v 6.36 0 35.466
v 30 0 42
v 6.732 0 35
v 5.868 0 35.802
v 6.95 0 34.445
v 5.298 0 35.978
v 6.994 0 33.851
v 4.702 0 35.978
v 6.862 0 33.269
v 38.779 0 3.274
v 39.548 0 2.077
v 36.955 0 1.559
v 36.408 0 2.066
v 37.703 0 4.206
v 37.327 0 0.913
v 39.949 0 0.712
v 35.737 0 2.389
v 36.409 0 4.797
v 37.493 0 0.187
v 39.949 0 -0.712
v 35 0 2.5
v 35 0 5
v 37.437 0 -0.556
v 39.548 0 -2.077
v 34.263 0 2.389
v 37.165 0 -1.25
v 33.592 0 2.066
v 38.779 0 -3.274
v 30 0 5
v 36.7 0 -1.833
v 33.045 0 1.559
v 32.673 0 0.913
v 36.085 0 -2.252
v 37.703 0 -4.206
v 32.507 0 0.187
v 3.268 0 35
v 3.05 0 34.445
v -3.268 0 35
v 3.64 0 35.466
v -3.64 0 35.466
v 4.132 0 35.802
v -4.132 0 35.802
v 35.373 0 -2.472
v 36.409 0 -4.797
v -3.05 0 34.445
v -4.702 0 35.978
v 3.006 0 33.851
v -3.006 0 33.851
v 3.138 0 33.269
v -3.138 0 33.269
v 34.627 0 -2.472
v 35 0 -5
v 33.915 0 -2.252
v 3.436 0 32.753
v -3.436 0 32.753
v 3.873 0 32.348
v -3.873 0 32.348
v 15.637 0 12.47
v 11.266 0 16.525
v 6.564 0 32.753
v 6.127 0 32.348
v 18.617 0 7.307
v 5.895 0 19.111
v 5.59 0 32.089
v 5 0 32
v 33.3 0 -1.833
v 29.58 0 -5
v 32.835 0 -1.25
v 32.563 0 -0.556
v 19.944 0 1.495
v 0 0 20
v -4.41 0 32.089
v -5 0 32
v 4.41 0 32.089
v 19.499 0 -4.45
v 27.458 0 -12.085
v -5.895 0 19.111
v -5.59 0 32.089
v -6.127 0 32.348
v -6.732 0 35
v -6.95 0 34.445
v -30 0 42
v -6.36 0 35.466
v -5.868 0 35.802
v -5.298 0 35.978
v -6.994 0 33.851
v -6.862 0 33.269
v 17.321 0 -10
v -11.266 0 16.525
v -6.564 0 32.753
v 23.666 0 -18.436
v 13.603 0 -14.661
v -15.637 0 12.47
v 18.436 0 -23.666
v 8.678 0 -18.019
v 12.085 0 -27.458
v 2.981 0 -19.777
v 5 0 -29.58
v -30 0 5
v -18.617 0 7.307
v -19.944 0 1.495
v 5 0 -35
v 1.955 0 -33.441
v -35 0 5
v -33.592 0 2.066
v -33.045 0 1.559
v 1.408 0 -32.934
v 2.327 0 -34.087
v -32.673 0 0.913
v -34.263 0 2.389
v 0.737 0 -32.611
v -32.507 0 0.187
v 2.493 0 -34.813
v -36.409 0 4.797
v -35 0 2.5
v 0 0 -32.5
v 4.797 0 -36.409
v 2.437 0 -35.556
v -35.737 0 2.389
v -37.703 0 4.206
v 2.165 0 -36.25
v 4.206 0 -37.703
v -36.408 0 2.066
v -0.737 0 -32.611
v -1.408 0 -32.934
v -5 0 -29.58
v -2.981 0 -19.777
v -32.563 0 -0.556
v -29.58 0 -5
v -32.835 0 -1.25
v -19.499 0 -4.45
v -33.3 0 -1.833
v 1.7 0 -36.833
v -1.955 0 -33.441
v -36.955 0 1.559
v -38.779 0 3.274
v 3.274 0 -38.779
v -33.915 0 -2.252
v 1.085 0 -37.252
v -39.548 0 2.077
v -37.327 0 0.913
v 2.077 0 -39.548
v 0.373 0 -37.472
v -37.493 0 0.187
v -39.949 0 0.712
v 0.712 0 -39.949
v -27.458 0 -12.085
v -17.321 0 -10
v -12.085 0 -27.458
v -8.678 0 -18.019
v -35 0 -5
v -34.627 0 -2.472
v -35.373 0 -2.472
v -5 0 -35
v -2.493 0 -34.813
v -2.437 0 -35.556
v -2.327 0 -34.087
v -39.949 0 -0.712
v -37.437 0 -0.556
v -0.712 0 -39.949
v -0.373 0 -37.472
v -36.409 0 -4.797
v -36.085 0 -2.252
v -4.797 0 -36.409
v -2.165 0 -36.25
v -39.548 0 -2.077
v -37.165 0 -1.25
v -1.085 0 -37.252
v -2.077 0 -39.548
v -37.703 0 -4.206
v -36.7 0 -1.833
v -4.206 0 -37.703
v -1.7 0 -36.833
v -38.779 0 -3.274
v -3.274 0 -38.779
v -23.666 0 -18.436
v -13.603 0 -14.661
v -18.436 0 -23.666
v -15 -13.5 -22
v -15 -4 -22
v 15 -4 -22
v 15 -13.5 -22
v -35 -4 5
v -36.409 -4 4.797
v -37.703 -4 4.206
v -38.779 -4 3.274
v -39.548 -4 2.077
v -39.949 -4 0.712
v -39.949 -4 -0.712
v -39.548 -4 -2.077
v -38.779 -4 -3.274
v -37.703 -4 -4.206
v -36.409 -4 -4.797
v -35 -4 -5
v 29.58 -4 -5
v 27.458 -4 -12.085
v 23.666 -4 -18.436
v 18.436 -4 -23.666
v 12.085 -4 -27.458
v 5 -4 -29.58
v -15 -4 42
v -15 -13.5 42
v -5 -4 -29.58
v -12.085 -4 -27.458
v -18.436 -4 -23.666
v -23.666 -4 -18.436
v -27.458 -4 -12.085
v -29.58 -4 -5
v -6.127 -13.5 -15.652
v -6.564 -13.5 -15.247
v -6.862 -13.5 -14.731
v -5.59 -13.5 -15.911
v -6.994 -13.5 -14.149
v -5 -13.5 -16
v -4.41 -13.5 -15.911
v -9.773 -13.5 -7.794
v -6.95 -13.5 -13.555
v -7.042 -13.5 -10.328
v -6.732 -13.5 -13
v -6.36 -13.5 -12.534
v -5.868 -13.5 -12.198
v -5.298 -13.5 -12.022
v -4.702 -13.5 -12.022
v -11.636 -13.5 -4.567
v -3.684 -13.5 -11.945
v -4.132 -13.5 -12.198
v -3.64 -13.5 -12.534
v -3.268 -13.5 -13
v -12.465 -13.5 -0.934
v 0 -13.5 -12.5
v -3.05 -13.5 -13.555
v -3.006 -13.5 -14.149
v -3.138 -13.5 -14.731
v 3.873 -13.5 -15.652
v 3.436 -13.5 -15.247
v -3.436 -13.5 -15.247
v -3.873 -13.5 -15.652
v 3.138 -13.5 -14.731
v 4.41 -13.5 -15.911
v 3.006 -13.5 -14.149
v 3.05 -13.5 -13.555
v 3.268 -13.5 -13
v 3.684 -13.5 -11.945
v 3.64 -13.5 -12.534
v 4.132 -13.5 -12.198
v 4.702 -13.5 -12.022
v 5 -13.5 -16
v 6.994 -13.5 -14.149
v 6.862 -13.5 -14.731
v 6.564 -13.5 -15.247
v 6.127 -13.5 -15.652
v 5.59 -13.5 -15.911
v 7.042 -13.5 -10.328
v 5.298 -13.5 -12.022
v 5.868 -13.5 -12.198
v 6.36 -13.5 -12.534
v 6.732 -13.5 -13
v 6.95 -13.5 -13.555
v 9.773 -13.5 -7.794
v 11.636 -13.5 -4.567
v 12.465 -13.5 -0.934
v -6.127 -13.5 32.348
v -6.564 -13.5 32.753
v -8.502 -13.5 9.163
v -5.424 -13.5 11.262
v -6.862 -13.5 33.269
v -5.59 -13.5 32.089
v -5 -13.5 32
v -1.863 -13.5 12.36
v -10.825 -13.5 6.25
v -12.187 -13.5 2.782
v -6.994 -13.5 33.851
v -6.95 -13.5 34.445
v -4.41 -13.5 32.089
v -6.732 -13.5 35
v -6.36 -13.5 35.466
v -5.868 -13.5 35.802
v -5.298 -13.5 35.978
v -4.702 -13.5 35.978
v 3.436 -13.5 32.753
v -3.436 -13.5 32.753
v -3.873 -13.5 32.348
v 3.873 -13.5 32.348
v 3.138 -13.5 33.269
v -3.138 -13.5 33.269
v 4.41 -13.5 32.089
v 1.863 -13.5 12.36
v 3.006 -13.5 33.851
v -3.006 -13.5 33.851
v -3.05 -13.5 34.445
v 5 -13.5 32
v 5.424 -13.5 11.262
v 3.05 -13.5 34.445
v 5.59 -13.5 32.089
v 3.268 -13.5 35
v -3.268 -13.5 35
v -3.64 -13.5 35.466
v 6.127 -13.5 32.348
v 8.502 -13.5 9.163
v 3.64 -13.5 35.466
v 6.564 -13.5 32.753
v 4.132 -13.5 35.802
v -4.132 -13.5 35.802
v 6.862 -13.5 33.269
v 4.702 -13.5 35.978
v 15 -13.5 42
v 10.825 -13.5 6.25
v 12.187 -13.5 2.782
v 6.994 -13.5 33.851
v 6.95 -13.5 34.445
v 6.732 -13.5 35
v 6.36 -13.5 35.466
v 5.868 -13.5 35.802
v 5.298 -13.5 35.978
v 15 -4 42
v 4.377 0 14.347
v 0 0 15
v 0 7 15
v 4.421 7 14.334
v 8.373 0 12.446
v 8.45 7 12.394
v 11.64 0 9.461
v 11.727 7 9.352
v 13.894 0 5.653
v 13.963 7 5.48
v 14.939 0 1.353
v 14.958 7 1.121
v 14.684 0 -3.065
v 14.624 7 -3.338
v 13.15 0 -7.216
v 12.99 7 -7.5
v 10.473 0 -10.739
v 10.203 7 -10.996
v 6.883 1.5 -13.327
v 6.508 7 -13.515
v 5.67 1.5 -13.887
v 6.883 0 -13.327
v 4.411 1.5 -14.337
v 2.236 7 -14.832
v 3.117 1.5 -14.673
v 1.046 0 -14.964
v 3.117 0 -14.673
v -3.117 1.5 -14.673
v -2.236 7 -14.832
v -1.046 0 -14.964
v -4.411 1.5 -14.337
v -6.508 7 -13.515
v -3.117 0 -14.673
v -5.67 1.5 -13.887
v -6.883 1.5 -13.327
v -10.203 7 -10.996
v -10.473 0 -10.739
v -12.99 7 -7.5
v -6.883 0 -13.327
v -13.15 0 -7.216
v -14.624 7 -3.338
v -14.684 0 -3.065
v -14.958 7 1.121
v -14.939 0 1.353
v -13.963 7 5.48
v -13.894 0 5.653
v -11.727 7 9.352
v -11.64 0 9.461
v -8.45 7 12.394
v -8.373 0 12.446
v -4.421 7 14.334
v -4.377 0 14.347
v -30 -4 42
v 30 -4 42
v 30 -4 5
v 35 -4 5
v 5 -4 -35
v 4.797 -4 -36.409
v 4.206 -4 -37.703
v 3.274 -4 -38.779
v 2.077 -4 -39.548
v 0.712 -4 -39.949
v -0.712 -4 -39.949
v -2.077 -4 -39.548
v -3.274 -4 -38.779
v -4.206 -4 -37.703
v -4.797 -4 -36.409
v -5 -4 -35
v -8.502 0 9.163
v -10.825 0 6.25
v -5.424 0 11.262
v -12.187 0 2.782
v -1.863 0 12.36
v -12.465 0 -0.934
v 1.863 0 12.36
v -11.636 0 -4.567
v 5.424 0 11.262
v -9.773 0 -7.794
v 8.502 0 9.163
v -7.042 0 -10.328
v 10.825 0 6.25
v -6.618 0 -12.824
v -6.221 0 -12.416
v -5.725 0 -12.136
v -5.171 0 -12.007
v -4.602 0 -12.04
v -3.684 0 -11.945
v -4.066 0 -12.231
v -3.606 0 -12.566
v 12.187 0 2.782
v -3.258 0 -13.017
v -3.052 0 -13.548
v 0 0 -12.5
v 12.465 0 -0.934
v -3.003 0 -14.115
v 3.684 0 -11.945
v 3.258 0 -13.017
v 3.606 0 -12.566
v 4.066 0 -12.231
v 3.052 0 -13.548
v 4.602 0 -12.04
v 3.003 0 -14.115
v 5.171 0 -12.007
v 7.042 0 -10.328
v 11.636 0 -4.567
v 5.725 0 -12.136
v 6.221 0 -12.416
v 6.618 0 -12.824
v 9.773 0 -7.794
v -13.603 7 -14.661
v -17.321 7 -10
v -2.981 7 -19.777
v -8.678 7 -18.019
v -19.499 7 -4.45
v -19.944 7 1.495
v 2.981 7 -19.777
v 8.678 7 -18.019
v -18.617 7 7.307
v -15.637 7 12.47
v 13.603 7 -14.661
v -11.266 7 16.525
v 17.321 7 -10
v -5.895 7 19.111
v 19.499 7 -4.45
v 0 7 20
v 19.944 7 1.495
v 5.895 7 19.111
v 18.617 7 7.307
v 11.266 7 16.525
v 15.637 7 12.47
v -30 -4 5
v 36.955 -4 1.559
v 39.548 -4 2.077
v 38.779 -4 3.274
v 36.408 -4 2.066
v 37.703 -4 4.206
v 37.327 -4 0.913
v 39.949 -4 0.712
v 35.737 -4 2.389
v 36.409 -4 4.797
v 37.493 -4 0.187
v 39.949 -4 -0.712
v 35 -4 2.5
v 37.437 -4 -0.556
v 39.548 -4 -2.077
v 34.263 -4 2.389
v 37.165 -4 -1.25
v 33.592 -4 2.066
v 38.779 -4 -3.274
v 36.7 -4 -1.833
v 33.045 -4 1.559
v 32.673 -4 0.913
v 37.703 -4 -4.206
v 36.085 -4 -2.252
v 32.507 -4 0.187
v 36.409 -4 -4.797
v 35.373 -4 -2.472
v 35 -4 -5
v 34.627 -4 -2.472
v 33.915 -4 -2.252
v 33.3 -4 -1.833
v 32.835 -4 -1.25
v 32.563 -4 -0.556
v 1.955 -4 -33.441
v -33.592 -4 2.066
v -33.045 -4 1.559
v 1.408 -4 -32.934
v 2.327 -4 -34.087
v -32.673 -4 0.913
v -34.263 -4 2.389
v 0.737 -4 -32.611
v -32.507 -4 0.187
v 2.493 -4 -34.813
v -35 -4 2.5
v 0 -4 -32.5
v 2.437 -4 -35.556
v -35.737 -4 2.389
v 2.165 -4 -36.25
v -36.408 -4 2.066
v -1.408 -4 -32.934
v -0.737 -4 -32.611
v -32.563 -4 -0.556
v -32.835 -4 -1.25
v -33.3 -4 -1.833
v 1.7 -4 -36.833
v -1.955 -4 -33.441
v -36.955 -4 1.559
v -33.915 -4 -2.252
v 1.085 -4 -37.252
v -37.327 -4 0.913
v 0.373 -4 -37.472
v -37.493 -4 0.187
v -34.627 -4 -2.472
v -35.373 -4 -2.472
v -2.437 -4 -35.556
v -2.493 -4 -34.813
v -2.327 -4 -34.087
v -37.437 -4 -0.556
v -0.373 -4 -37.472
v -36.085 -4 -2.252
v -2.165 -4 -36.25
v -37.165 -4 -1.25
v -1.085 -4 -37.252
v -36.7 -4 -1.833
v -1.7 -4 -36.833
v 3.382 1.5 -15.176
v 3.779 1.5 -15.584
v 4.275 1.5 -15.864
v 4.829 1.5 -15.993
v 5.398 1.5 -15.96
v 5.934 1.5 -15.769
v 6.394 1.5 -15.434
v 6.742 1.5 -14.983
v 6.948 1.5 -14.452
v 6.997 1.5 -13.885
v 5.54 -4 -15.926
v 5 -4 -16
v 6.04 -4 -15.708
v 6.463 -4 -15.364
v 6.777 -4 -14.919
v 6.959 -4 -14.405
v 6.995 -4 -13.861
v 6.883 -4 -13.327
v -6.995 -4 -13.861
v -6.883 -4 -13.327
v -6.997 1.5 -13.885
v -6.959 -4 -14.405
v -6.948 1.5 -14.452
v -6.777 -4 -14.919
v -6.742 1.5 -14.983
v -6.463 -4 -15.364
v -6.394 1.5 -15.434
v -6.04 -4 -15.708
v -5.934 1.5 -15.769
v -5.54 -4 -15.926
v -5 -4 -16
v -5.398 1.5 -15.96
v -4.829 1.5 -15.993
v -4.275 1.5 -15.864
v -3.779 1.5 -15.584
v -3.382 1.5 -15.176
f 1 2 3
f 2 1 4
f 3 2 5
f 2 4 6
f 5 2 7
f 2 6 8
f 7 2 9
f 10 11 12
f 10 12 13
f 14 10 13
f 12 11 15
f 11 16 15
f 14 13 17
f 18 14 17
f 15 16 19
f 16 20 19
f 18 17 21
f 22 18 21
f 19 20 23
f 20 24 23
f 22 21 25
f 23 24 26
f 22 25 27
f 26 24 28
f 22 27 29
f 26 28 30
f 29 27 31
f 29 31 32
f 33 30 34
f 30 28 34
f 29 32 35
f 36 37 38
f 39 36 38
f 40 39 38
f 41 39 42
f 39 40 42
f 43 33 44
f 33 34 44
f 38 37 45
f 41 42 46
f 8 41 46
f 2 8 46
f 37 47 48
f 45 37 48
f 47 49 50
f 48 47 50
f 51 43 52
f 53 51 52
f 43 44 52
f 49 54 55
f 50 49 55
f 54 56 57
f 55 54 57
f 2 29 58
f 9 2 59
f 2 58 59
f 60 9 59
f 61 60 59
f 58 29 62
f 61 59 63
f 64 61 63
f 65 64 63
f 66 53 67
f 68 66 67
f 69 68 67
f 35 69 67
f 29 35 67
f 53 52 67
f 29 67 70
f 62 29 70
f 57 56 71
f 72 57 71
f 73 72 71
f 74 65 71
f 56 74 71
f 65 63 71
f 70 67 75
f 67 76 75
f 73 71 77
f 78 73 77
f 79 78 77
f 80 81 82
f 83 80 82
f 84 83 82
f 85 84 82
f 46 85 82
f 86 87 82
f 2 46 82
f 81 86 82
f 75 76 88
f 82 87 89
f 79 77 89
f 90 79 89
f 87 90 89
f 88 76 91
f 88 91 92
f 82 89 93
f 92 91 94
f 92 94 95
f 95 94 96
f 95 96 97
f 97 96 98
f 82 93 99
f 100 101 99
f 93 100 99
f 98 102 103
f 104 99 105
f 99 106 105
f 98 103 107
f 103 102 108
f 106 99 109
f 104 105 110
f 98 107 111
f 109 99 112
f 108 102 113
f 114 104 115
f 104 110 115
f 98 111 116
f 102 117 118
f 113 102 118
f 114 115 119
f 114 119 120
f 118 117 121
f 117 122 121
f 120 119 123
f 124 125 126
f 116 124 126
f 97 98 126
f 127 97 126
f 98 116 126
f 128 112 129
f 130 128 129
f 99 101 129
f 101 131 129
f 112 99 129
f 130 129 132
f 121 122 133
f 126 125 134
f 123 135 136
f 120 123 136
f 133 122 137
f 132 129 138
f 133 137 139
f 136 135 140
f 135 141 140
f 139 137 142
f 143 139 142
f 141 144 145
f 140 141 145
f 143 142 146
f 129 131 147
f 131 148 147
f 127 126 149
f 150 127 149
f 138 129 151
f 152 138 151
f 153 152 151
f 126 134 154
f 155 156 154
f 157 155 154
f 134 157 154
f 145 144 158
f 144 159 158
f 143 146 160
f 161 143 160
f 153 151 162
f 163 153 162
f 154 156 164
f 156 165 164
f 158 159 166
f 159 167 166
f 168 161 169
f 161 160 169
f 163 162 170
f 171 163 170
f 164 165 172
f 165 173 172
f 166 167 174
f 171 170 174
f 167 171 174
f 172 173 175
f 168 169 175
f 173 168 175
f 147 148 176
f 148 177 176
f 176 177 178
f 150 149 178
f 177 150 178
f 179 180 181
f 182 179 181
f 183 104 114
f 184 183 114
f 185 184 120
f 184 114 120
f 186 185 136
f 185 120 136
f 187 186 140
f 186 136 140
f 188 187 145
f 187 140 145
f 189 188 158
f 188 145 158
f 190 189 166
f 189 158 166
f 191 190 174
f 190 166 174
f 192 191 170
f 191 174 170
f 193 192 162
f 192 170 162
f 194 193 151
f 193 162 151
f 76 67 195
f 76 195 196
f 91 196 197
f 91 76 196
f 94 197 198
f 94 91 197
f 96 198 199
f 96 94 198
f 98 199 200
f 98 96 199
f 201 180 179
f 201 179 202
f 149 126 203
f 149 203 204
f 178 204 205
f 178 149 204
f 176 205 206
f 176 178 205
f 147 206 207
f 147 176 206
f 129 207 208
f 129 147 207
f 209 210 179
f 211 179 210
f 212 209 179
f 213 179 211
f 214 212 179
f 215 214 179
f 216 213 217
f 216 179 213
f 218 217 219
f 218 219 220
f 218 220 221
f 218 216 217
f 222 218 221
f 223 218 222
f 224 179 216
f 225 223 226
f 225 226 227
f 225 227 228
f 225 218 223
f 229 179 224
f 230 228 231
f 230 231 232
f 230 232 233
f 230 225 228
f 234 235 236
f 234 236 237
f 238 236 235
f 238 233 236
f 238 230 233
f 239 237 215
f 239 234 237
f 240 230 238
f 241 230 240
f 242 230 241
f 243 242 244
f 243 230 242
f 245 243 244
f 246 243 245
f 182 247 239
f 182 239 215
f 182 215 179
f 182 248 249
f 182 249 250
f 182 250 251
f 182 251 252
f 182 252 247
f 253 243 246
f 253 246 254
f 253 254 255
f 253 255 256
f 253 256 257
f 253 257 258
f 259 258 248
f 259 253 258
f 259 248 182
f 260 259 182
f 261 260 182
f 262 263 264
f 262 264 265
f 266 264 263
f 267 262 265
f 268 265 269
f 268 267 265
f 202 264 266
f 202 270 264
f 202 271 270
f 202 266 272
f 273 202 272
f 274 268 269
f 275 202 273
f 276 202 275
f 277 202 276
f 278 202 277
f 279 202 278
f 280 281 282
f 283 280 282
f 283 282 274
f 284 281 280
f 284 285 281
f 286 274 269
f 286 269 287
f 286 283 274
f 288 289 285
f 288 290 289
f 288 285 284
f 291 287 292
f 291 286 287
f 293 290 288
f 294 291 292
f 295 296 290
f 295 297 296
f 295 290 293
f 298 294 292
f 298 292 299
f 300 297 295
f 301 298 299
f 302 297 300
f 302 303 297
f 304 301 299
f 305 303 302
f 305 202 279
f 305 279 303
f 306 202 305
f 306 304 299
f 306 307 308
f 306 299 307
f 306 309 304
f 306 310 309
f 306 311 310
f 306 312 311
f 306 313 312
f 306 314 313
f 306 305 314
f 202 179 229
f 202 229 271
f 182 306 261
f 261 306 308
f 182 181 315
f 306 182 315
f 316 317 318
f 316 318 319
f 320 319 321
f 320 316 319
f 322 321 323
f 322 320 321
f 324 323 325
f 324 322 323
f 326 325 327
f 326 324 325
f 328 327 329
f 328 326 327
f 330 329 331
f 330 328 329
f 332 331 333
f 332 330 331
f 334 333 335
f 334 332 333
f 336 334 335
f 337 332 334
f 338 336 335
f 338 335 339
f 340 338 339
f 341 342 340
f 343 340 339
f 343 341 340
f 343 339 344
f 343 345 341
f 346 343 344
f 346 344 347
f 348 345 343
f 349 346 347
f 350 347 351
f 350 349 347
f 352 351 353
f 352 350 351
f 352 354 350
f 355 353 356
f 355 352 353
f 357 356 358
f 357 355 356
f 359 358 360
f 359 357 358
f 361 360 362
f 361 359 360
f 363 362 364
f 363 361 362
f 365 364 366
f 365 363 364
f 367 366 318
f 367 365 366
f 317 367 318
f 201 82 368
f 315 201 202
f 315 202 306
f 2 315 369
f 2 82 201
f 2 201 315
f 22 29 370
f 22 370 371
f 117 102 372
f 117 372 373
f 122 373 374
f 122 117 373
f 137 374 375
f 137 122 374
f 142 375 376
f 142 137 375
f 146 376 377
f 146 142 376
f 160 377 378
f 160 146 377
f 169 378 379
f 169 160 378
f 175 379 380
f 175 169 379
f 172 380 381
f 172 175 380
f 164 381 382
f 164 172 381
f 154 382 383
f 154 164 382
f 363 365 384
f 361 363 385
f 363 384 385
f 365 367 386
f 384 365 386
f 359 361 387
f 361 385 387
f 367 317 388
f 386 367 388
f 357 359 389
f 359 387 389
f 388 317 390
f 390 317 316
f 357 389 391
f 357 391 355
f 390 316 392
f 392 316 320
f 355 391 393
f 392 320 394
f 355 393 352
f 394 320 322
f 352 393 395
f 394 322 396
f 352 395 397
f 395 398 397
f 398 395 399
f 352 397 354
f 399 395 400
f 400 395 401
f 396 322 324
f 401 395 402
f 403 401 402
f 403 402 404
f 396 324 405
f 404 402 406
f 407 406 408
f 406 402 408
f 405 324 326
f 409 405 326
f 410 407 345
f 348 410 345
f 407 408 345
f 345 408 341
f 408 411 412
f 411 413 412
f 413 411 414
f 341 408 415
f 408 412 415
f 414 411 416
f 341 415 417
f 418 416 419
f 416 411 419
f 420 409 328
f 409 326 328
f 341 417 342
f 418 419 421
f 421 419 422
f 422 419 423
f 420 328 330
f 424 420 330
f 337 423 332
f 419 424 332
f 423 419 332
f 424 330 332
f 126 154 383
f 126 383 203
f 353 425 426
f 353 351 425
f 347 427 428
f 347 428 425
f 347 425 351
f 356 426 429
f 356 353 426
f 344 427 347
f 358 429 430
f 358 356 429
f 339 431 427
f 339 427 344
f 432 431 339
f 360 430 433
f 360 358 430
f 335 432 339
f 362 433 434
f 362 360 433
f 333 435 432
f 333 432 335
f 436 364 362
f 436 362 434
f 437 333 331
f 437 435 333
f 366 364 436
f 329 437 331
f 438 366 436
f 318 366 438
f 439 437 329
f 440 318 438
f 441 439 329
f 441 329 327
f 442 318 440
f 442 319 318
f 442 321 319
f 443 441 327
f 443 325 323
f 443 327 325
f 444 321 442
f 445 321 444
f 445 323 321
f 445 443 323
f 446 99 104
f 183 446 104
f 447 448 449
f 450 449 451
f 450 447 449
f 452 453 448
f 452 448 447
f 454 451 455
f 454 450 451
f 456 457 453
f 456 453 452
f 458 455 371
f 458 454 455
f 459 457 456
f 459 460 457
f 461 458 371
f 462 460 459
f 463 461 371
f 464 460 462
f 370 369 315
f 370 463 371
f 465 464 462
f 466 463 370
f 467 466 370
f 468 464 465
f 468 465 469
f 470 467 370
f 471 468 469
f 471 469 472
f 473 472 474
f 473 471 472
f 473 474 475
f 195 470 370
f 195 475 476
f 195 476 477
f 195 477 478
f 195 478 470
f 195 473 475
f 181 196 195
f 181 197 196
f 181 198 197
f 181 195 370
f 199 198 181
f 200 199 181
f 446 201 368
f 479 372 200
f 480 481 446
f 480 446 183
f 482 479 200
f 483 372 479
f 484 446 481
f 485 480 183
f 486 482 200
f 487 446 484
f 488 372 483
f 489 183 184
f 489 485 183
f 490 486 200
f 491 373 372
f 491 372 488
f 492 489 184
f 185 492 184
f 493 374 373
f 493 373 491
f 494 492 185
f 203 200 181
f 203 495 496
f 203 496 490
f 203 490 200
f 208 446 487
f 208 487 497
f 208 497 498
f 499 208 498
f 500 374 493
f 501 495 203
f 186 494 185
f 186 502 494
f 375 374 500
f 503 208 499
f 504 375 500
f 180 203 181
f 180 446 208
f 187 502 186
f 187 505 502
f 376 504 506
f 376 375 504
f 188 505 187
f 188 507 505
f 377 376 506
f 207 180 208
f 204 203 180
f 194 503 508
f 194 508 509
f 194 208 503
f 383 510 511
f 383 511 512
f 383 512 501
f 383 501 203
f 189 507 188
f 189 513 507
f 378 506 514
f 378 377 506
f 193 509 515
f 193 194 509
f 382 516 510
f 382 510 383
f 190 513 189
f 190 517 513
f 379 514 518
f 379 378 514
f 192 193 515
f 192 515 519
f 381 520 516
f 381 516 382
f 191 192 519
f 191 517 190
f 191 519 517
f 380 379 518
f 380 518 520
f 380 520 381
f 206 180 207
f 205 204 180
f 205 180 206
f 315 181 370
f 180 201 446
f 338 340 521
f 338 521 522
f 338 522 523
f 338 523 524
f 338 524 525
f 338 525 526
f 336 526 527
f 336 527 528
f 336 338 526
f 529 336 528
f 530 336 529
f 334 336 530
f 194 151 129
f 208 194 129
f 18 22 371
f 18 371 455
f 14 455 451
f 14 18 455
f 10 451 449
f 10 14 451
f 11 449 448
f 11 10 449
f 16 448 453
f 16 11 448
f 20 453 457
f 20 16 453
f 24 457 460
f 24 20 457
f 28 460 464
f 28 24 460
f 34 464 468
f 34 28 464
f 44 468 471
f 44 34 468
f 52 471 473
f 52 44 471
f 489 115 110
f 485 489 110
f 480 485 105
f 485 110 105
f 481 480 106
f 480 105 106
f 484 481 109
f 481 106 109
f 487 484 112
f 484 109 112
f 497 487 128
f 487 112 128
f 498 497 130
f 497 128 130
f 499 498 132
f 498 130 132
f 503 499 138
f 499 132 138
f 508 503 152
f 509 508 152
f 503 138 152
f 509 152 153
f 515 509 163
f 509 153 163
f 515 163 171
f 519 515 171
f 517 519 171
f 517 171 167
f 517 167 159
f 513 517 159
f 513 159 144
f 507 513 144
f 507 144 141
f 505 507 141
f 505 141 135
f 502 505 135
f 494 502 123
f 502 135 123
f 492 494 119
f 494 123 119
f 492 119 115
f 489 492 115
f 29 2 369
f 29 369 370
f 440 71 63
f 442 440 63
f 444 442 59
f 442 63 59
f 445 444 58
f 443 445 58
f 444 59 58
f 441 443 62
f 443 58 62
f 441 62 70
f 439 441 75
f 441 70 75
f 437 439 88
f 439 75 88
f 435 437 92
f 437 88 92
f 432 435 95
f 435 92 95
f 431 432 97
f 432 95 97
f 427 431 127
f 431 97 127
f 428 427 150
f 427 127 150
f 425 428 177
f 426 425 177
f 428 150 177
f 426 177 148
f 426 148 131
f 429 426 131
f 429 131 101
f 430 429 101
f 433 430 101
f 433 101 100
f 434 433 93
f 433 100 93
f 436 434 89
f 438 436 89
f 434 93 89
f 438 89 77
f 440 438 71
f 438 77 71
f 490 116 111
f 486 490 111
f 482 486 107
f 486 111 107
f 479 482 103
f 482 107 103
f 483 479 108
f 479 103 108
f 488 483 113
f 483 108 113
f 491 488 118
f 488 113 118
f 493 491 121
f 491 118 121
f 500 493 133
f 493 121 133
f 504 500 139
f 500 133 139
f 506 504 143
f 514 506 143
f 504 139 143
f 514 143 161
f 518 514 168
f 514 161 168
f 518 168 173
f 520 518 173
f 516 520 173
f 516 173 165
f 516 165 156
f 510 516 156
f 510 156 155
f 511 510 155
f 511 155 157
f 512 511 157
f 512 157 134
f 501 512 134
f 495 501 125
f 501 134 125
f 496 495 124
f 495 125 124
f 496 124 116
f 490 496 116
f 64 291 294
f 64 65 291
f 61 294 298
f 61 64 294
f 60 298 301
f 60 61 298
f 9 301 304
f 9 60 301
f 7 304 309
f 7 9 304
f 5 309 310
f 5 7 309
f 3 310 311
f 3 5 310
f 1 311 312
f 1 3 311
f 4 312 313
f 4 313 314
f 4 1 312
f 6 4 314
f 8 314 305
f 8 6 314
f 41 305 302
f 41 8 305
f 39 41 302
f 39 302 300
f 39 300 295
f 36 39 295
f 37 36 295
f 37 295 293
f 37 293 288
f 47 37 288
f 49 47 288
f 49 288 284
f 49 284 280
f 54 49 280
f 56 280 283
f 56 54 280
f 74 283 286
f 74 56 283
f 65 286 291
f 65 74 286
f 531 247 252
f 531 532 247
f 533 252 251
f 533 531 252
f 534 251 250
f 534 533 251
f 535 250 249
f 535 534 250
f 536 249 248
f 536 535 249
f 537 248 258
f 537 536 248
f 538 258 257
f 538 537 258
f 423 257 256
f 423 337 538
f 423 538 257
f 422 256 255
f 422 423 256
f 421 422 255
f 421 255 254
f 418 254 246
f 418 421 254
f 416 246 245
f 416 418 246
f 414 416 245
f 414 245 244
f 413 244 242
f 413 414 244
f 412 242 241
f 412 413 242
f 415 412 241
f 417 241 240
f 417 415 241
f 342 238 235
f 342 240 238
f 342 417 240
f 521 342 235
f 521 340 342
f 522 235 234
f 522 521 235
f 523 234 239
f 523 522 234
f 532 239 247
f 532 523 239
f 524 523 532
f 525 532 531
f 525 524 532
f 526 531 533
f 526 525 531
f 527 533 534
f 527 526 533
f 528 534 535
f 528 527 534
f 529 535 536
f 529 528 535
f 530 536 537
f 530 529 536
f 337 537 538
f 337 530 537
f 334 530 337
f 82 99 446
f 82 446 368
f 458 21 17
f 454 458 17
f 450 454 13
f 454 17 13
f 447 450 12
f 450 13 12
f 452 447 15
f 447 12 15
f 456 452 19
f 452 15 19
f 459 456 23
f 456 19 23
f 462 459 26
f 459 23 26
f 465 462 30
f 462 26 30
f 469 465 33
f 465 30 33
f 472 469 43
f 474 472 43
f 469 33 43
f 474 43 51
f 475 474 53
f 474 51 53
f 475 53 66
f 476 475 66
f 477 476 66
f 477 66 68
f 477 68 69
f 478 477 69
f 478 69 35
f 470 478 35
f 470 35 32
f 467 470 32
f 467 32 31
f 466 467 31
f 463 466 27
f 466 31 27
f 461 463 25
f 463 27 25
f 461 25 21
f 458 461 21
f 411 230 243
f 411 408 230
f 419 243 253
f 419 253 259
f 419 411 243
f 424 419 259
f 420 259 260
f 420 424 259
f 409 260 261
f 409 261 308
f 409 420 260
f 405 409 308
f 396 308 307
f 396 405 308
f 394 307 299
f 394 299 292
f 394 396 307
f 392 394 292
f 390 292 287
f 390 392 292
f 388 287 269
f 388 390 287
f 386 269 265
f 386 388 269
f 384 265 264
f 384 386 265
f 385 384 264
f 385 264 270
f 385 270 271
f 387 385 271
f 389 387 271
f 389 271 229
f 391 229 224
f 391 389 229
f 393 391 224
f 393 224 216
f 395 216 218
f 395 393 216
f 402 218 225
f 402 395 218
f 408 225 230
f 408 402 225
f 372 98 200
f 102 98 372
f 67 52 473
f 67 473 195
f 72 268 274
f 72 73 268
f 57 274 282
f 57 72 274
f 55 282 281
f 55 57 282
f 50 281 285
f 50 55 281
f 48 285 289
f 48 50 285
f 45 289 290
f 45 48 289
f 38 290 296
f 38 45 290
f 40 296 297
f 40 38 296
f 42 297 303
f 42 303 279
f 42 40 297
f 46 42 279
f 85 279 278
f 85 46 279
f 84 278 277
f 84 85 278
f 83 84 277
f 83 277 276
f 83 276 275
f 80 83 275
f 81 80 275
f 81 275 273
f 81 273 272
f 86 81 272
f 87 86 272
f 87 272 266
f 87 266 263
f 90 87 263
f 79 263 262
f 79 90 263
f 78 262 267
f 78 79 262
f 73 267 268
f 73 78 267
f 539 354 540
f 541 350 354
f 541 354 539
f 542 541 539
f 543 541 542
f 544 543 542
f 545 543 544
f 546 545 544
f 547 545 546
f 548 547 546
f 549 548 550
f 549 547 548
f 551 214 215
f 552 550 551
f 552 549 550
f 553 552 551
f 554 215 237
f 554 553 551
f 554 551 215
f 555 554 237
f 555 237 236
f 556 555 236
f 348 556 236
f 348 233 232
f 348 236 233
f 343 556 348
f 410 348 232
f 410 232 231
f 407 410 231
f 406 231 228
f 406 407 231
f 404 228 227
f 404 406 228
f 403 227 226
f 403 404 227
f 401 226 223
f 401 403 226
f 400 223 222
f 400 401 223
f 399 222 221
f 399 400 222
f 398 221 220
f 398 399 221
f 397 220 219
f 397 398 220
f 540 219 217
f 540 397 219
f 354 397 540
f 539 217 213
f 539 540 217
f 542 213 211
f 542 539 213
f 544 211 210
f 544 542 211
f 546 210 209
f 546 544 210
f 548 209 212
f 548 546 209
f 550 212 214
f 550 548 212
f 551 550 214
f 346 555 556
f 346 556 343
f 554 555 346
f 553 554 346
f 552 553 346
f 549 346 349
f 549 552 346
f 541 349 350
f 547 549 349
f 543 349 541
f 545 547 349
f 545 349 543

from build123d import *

# Parameters (mm, degrees)
SKETCH_1_R          = 20
SKETCH_1_R_2        = 15
EXTRUDE_1_DEPTH     = 7
SKETCH_2_R          = 70
SKETCH_2_R_2        = 12.5
EXTRUDE_2_DEPTH     = 4
SKETCH_3_W          = 30
SKETCH_3_H          = 64
SKETCH_3_R          = 2
SKETCH_3_R_2        = 12.5
EXTRUDE_3_DEPTH     = 9.5
SKETCH_4_R          = 81.168465046
CUT_EXTRUDE_1_DEPTH = 9.5
CUT_EXTRUDE_START   = -15
SKETCH_6_R          = 2
CUT_EXTRUDE_2_DEPTH = 15
SKETCH_7_R          = 2.5
EXTRUDE_4_DEPTH     = 4


with BuildPart() as part:
    # Эскиз1 → Бобышка-Вытянуть1 (new body)
    with BuildSketch(Plane(origin=(0, 0, 0), x_dir=(1, 0, 0), z_dir=(0, 1, 0))):
        with Locations(Location((0, 0, 0), (0, 0, 270))):
            Circle(SKETCH_1_R)
        with Locations(Location((0, 0, 0), (0, 0, 270))):
            Circle(SKETCH_1_R_2, mode=Mode.SUBTRACT)
    extrude(amount=EXTRUDE_1_DEPTH)

    # Эскиз2 → Бобышка-Вытянуть2 (add)
    with BuildSketch(Plane.XZ):
        with Locations(Location((0, 0, 0), (0, 0, 270))):
            Circle(SKETCH_2_R)
        with Locations(Location((0, 0, 0), (0, 0, 270))):
            Circle(SKETCH_2_R_2, mode=Mode.SUBTRACT)
    extrude(amount=EXTRUDE_2_DEPTH)

    # Эскиз3 → Бобышка-Вытянуть3 (add)
    with BuildSketch(Plane.XZ.offset(4)):
        with Locations((0, 10)):
            Rectangle(SKETCH_3_W, SKETCH_3_H)
        with Locations(Location((-5, 34, 0), (0, 0, 270))):
            Circle(SKETCH_3_R, mode=Mode.SUBTRACT)
        with Locations(Location((5, 34, 0), (0, 0, 270))):
            Circle(SKETCH_3_R, mode=Mode.SUBTRACT)
        with Locations(Location((-5, -14, 0), (0, 0, 270))):
            Circle(SKETCH_3_R, mode=Mode.SUBTRACT)
        with Locations(Location((5, -14, 0), (0, 0, 270))):
            Circle(SKETCH_3_R, mode=Mode.SUBTRACT)
        with Locations(Location((0, 0, 0), (0, 0, 270))):
            Circle(SKETCH_3_R_2, mode=Mode.SUBTRACT)
    extrude(amount=EXTRUDE_3_DEPTH)

    # Эскиз4 → Вырез-Вытянуть1 (cut)
    with BuildSketch(Plane(origin=(0, 0, 0), x_dir=(1, 0, 0), z_dir=(0, 1, 0))):
        Circle(SKETCH_4_R)
        with BuildLine():
            Line((-30, 0), (-30, -42))
            Line((-30, -42), (30, -42))
            Line((30, -42), (30, 0))
            ThreePointArc((30, 0), (0, 30), (-30, 0))
        make_face(mode=Mode.SUBTRACT)
    extrude(amount=-CUT_EXTRUDE_1_DEPTH, mode=Mode.SUBTRACT)

    # Эскиз6 → Вырез-Вытянуть2 (cut)
    with BuildSketch(Plane.XZ.offset(13.5).offset(CUT_EXTRUDE_START)):
        with Locations(Location((-5, 34, 0), (0, 0, 270))):
            Circle(SKETCH_6_R)
        with Locations(Location((5, 34, 0), (0, 0, 270))):
            Circle(SKETCH_6_R)
        with Locations(Location((-5, -14, 0), (0, 0, 160.346175942))):
            Circle(SKETCH_6_R)
        with Locations(Location((5, -14, 0), (0, 0, 19.653824058))):
            Circle(SKETCH_6_R)
    extrude(amount=CUT_EXTRUDE_2_DEPTH, mode=Mode.SUBTRACT)

    # Эскиз7 → Бобышка-Вытянуть4 (add)
    # profile 1 of 3: a face of its own
    with BuildSketch(Plane(origin=(0, 0, 0), x_dir=(1, 0, 0), z_dir=(0, 1, 0))):
        with BuildLine():
            Line((-35, 5), (-27, 5))
            Line((-27, 5), (-27, -5))
            Line((-27, -5), (-35, -5))
            ThreePointArc((-35, -5), (-40, 0), (-35, 5))
        make_face()
        with Locations(Location((-35, 0, 0), (0, 0, 270))):
            Circle(SKETCH_7_R, mode=Mode.SUBTRACT)
    # profile 2 of 3: a face of its own
    with BuildSketch(Plane(origin=(0, 0, 0), x_dir=(1, 0, 0), z_dir=(0, 1, 0))):
        with BuildLine():
            Line((-5, 35), (-5, 27))
            Line((-5, 27), (5, 27))
            Line((5, 27), (5, 35))
            ThreePointArc((5, 35), (0, 40), (-5, 35))
        make_face()
        with Locations(Location((0, 35, 0), (0, 0, 270))):
            Circle(SKETCH_7_R, mode=Mode.SUBTRACT)
    # profile 3 of 3: a face of its own
    with BuildSketch(Plane(origin=(0, 0, 0), x_dir=(1, 0, 0), z_dir=(0, 1, 0))):
        with BuildLine():
            Line((35, 5), (27, 5))
            Line((27, 5), (27, -5))
            Line((27, -5), (35, -5))
            ThreePointArc((35, -5), (40, 0), (35, 5))
        make_face()
        with Locations(Location((35, 0, 0), (0, 0, 270))):
            Circle(SKETCH_7_R, mode=Mode.SUBTRACT)
    extrude(amount=-EXTRUDE_4_DEPTH)


solid = part.part
